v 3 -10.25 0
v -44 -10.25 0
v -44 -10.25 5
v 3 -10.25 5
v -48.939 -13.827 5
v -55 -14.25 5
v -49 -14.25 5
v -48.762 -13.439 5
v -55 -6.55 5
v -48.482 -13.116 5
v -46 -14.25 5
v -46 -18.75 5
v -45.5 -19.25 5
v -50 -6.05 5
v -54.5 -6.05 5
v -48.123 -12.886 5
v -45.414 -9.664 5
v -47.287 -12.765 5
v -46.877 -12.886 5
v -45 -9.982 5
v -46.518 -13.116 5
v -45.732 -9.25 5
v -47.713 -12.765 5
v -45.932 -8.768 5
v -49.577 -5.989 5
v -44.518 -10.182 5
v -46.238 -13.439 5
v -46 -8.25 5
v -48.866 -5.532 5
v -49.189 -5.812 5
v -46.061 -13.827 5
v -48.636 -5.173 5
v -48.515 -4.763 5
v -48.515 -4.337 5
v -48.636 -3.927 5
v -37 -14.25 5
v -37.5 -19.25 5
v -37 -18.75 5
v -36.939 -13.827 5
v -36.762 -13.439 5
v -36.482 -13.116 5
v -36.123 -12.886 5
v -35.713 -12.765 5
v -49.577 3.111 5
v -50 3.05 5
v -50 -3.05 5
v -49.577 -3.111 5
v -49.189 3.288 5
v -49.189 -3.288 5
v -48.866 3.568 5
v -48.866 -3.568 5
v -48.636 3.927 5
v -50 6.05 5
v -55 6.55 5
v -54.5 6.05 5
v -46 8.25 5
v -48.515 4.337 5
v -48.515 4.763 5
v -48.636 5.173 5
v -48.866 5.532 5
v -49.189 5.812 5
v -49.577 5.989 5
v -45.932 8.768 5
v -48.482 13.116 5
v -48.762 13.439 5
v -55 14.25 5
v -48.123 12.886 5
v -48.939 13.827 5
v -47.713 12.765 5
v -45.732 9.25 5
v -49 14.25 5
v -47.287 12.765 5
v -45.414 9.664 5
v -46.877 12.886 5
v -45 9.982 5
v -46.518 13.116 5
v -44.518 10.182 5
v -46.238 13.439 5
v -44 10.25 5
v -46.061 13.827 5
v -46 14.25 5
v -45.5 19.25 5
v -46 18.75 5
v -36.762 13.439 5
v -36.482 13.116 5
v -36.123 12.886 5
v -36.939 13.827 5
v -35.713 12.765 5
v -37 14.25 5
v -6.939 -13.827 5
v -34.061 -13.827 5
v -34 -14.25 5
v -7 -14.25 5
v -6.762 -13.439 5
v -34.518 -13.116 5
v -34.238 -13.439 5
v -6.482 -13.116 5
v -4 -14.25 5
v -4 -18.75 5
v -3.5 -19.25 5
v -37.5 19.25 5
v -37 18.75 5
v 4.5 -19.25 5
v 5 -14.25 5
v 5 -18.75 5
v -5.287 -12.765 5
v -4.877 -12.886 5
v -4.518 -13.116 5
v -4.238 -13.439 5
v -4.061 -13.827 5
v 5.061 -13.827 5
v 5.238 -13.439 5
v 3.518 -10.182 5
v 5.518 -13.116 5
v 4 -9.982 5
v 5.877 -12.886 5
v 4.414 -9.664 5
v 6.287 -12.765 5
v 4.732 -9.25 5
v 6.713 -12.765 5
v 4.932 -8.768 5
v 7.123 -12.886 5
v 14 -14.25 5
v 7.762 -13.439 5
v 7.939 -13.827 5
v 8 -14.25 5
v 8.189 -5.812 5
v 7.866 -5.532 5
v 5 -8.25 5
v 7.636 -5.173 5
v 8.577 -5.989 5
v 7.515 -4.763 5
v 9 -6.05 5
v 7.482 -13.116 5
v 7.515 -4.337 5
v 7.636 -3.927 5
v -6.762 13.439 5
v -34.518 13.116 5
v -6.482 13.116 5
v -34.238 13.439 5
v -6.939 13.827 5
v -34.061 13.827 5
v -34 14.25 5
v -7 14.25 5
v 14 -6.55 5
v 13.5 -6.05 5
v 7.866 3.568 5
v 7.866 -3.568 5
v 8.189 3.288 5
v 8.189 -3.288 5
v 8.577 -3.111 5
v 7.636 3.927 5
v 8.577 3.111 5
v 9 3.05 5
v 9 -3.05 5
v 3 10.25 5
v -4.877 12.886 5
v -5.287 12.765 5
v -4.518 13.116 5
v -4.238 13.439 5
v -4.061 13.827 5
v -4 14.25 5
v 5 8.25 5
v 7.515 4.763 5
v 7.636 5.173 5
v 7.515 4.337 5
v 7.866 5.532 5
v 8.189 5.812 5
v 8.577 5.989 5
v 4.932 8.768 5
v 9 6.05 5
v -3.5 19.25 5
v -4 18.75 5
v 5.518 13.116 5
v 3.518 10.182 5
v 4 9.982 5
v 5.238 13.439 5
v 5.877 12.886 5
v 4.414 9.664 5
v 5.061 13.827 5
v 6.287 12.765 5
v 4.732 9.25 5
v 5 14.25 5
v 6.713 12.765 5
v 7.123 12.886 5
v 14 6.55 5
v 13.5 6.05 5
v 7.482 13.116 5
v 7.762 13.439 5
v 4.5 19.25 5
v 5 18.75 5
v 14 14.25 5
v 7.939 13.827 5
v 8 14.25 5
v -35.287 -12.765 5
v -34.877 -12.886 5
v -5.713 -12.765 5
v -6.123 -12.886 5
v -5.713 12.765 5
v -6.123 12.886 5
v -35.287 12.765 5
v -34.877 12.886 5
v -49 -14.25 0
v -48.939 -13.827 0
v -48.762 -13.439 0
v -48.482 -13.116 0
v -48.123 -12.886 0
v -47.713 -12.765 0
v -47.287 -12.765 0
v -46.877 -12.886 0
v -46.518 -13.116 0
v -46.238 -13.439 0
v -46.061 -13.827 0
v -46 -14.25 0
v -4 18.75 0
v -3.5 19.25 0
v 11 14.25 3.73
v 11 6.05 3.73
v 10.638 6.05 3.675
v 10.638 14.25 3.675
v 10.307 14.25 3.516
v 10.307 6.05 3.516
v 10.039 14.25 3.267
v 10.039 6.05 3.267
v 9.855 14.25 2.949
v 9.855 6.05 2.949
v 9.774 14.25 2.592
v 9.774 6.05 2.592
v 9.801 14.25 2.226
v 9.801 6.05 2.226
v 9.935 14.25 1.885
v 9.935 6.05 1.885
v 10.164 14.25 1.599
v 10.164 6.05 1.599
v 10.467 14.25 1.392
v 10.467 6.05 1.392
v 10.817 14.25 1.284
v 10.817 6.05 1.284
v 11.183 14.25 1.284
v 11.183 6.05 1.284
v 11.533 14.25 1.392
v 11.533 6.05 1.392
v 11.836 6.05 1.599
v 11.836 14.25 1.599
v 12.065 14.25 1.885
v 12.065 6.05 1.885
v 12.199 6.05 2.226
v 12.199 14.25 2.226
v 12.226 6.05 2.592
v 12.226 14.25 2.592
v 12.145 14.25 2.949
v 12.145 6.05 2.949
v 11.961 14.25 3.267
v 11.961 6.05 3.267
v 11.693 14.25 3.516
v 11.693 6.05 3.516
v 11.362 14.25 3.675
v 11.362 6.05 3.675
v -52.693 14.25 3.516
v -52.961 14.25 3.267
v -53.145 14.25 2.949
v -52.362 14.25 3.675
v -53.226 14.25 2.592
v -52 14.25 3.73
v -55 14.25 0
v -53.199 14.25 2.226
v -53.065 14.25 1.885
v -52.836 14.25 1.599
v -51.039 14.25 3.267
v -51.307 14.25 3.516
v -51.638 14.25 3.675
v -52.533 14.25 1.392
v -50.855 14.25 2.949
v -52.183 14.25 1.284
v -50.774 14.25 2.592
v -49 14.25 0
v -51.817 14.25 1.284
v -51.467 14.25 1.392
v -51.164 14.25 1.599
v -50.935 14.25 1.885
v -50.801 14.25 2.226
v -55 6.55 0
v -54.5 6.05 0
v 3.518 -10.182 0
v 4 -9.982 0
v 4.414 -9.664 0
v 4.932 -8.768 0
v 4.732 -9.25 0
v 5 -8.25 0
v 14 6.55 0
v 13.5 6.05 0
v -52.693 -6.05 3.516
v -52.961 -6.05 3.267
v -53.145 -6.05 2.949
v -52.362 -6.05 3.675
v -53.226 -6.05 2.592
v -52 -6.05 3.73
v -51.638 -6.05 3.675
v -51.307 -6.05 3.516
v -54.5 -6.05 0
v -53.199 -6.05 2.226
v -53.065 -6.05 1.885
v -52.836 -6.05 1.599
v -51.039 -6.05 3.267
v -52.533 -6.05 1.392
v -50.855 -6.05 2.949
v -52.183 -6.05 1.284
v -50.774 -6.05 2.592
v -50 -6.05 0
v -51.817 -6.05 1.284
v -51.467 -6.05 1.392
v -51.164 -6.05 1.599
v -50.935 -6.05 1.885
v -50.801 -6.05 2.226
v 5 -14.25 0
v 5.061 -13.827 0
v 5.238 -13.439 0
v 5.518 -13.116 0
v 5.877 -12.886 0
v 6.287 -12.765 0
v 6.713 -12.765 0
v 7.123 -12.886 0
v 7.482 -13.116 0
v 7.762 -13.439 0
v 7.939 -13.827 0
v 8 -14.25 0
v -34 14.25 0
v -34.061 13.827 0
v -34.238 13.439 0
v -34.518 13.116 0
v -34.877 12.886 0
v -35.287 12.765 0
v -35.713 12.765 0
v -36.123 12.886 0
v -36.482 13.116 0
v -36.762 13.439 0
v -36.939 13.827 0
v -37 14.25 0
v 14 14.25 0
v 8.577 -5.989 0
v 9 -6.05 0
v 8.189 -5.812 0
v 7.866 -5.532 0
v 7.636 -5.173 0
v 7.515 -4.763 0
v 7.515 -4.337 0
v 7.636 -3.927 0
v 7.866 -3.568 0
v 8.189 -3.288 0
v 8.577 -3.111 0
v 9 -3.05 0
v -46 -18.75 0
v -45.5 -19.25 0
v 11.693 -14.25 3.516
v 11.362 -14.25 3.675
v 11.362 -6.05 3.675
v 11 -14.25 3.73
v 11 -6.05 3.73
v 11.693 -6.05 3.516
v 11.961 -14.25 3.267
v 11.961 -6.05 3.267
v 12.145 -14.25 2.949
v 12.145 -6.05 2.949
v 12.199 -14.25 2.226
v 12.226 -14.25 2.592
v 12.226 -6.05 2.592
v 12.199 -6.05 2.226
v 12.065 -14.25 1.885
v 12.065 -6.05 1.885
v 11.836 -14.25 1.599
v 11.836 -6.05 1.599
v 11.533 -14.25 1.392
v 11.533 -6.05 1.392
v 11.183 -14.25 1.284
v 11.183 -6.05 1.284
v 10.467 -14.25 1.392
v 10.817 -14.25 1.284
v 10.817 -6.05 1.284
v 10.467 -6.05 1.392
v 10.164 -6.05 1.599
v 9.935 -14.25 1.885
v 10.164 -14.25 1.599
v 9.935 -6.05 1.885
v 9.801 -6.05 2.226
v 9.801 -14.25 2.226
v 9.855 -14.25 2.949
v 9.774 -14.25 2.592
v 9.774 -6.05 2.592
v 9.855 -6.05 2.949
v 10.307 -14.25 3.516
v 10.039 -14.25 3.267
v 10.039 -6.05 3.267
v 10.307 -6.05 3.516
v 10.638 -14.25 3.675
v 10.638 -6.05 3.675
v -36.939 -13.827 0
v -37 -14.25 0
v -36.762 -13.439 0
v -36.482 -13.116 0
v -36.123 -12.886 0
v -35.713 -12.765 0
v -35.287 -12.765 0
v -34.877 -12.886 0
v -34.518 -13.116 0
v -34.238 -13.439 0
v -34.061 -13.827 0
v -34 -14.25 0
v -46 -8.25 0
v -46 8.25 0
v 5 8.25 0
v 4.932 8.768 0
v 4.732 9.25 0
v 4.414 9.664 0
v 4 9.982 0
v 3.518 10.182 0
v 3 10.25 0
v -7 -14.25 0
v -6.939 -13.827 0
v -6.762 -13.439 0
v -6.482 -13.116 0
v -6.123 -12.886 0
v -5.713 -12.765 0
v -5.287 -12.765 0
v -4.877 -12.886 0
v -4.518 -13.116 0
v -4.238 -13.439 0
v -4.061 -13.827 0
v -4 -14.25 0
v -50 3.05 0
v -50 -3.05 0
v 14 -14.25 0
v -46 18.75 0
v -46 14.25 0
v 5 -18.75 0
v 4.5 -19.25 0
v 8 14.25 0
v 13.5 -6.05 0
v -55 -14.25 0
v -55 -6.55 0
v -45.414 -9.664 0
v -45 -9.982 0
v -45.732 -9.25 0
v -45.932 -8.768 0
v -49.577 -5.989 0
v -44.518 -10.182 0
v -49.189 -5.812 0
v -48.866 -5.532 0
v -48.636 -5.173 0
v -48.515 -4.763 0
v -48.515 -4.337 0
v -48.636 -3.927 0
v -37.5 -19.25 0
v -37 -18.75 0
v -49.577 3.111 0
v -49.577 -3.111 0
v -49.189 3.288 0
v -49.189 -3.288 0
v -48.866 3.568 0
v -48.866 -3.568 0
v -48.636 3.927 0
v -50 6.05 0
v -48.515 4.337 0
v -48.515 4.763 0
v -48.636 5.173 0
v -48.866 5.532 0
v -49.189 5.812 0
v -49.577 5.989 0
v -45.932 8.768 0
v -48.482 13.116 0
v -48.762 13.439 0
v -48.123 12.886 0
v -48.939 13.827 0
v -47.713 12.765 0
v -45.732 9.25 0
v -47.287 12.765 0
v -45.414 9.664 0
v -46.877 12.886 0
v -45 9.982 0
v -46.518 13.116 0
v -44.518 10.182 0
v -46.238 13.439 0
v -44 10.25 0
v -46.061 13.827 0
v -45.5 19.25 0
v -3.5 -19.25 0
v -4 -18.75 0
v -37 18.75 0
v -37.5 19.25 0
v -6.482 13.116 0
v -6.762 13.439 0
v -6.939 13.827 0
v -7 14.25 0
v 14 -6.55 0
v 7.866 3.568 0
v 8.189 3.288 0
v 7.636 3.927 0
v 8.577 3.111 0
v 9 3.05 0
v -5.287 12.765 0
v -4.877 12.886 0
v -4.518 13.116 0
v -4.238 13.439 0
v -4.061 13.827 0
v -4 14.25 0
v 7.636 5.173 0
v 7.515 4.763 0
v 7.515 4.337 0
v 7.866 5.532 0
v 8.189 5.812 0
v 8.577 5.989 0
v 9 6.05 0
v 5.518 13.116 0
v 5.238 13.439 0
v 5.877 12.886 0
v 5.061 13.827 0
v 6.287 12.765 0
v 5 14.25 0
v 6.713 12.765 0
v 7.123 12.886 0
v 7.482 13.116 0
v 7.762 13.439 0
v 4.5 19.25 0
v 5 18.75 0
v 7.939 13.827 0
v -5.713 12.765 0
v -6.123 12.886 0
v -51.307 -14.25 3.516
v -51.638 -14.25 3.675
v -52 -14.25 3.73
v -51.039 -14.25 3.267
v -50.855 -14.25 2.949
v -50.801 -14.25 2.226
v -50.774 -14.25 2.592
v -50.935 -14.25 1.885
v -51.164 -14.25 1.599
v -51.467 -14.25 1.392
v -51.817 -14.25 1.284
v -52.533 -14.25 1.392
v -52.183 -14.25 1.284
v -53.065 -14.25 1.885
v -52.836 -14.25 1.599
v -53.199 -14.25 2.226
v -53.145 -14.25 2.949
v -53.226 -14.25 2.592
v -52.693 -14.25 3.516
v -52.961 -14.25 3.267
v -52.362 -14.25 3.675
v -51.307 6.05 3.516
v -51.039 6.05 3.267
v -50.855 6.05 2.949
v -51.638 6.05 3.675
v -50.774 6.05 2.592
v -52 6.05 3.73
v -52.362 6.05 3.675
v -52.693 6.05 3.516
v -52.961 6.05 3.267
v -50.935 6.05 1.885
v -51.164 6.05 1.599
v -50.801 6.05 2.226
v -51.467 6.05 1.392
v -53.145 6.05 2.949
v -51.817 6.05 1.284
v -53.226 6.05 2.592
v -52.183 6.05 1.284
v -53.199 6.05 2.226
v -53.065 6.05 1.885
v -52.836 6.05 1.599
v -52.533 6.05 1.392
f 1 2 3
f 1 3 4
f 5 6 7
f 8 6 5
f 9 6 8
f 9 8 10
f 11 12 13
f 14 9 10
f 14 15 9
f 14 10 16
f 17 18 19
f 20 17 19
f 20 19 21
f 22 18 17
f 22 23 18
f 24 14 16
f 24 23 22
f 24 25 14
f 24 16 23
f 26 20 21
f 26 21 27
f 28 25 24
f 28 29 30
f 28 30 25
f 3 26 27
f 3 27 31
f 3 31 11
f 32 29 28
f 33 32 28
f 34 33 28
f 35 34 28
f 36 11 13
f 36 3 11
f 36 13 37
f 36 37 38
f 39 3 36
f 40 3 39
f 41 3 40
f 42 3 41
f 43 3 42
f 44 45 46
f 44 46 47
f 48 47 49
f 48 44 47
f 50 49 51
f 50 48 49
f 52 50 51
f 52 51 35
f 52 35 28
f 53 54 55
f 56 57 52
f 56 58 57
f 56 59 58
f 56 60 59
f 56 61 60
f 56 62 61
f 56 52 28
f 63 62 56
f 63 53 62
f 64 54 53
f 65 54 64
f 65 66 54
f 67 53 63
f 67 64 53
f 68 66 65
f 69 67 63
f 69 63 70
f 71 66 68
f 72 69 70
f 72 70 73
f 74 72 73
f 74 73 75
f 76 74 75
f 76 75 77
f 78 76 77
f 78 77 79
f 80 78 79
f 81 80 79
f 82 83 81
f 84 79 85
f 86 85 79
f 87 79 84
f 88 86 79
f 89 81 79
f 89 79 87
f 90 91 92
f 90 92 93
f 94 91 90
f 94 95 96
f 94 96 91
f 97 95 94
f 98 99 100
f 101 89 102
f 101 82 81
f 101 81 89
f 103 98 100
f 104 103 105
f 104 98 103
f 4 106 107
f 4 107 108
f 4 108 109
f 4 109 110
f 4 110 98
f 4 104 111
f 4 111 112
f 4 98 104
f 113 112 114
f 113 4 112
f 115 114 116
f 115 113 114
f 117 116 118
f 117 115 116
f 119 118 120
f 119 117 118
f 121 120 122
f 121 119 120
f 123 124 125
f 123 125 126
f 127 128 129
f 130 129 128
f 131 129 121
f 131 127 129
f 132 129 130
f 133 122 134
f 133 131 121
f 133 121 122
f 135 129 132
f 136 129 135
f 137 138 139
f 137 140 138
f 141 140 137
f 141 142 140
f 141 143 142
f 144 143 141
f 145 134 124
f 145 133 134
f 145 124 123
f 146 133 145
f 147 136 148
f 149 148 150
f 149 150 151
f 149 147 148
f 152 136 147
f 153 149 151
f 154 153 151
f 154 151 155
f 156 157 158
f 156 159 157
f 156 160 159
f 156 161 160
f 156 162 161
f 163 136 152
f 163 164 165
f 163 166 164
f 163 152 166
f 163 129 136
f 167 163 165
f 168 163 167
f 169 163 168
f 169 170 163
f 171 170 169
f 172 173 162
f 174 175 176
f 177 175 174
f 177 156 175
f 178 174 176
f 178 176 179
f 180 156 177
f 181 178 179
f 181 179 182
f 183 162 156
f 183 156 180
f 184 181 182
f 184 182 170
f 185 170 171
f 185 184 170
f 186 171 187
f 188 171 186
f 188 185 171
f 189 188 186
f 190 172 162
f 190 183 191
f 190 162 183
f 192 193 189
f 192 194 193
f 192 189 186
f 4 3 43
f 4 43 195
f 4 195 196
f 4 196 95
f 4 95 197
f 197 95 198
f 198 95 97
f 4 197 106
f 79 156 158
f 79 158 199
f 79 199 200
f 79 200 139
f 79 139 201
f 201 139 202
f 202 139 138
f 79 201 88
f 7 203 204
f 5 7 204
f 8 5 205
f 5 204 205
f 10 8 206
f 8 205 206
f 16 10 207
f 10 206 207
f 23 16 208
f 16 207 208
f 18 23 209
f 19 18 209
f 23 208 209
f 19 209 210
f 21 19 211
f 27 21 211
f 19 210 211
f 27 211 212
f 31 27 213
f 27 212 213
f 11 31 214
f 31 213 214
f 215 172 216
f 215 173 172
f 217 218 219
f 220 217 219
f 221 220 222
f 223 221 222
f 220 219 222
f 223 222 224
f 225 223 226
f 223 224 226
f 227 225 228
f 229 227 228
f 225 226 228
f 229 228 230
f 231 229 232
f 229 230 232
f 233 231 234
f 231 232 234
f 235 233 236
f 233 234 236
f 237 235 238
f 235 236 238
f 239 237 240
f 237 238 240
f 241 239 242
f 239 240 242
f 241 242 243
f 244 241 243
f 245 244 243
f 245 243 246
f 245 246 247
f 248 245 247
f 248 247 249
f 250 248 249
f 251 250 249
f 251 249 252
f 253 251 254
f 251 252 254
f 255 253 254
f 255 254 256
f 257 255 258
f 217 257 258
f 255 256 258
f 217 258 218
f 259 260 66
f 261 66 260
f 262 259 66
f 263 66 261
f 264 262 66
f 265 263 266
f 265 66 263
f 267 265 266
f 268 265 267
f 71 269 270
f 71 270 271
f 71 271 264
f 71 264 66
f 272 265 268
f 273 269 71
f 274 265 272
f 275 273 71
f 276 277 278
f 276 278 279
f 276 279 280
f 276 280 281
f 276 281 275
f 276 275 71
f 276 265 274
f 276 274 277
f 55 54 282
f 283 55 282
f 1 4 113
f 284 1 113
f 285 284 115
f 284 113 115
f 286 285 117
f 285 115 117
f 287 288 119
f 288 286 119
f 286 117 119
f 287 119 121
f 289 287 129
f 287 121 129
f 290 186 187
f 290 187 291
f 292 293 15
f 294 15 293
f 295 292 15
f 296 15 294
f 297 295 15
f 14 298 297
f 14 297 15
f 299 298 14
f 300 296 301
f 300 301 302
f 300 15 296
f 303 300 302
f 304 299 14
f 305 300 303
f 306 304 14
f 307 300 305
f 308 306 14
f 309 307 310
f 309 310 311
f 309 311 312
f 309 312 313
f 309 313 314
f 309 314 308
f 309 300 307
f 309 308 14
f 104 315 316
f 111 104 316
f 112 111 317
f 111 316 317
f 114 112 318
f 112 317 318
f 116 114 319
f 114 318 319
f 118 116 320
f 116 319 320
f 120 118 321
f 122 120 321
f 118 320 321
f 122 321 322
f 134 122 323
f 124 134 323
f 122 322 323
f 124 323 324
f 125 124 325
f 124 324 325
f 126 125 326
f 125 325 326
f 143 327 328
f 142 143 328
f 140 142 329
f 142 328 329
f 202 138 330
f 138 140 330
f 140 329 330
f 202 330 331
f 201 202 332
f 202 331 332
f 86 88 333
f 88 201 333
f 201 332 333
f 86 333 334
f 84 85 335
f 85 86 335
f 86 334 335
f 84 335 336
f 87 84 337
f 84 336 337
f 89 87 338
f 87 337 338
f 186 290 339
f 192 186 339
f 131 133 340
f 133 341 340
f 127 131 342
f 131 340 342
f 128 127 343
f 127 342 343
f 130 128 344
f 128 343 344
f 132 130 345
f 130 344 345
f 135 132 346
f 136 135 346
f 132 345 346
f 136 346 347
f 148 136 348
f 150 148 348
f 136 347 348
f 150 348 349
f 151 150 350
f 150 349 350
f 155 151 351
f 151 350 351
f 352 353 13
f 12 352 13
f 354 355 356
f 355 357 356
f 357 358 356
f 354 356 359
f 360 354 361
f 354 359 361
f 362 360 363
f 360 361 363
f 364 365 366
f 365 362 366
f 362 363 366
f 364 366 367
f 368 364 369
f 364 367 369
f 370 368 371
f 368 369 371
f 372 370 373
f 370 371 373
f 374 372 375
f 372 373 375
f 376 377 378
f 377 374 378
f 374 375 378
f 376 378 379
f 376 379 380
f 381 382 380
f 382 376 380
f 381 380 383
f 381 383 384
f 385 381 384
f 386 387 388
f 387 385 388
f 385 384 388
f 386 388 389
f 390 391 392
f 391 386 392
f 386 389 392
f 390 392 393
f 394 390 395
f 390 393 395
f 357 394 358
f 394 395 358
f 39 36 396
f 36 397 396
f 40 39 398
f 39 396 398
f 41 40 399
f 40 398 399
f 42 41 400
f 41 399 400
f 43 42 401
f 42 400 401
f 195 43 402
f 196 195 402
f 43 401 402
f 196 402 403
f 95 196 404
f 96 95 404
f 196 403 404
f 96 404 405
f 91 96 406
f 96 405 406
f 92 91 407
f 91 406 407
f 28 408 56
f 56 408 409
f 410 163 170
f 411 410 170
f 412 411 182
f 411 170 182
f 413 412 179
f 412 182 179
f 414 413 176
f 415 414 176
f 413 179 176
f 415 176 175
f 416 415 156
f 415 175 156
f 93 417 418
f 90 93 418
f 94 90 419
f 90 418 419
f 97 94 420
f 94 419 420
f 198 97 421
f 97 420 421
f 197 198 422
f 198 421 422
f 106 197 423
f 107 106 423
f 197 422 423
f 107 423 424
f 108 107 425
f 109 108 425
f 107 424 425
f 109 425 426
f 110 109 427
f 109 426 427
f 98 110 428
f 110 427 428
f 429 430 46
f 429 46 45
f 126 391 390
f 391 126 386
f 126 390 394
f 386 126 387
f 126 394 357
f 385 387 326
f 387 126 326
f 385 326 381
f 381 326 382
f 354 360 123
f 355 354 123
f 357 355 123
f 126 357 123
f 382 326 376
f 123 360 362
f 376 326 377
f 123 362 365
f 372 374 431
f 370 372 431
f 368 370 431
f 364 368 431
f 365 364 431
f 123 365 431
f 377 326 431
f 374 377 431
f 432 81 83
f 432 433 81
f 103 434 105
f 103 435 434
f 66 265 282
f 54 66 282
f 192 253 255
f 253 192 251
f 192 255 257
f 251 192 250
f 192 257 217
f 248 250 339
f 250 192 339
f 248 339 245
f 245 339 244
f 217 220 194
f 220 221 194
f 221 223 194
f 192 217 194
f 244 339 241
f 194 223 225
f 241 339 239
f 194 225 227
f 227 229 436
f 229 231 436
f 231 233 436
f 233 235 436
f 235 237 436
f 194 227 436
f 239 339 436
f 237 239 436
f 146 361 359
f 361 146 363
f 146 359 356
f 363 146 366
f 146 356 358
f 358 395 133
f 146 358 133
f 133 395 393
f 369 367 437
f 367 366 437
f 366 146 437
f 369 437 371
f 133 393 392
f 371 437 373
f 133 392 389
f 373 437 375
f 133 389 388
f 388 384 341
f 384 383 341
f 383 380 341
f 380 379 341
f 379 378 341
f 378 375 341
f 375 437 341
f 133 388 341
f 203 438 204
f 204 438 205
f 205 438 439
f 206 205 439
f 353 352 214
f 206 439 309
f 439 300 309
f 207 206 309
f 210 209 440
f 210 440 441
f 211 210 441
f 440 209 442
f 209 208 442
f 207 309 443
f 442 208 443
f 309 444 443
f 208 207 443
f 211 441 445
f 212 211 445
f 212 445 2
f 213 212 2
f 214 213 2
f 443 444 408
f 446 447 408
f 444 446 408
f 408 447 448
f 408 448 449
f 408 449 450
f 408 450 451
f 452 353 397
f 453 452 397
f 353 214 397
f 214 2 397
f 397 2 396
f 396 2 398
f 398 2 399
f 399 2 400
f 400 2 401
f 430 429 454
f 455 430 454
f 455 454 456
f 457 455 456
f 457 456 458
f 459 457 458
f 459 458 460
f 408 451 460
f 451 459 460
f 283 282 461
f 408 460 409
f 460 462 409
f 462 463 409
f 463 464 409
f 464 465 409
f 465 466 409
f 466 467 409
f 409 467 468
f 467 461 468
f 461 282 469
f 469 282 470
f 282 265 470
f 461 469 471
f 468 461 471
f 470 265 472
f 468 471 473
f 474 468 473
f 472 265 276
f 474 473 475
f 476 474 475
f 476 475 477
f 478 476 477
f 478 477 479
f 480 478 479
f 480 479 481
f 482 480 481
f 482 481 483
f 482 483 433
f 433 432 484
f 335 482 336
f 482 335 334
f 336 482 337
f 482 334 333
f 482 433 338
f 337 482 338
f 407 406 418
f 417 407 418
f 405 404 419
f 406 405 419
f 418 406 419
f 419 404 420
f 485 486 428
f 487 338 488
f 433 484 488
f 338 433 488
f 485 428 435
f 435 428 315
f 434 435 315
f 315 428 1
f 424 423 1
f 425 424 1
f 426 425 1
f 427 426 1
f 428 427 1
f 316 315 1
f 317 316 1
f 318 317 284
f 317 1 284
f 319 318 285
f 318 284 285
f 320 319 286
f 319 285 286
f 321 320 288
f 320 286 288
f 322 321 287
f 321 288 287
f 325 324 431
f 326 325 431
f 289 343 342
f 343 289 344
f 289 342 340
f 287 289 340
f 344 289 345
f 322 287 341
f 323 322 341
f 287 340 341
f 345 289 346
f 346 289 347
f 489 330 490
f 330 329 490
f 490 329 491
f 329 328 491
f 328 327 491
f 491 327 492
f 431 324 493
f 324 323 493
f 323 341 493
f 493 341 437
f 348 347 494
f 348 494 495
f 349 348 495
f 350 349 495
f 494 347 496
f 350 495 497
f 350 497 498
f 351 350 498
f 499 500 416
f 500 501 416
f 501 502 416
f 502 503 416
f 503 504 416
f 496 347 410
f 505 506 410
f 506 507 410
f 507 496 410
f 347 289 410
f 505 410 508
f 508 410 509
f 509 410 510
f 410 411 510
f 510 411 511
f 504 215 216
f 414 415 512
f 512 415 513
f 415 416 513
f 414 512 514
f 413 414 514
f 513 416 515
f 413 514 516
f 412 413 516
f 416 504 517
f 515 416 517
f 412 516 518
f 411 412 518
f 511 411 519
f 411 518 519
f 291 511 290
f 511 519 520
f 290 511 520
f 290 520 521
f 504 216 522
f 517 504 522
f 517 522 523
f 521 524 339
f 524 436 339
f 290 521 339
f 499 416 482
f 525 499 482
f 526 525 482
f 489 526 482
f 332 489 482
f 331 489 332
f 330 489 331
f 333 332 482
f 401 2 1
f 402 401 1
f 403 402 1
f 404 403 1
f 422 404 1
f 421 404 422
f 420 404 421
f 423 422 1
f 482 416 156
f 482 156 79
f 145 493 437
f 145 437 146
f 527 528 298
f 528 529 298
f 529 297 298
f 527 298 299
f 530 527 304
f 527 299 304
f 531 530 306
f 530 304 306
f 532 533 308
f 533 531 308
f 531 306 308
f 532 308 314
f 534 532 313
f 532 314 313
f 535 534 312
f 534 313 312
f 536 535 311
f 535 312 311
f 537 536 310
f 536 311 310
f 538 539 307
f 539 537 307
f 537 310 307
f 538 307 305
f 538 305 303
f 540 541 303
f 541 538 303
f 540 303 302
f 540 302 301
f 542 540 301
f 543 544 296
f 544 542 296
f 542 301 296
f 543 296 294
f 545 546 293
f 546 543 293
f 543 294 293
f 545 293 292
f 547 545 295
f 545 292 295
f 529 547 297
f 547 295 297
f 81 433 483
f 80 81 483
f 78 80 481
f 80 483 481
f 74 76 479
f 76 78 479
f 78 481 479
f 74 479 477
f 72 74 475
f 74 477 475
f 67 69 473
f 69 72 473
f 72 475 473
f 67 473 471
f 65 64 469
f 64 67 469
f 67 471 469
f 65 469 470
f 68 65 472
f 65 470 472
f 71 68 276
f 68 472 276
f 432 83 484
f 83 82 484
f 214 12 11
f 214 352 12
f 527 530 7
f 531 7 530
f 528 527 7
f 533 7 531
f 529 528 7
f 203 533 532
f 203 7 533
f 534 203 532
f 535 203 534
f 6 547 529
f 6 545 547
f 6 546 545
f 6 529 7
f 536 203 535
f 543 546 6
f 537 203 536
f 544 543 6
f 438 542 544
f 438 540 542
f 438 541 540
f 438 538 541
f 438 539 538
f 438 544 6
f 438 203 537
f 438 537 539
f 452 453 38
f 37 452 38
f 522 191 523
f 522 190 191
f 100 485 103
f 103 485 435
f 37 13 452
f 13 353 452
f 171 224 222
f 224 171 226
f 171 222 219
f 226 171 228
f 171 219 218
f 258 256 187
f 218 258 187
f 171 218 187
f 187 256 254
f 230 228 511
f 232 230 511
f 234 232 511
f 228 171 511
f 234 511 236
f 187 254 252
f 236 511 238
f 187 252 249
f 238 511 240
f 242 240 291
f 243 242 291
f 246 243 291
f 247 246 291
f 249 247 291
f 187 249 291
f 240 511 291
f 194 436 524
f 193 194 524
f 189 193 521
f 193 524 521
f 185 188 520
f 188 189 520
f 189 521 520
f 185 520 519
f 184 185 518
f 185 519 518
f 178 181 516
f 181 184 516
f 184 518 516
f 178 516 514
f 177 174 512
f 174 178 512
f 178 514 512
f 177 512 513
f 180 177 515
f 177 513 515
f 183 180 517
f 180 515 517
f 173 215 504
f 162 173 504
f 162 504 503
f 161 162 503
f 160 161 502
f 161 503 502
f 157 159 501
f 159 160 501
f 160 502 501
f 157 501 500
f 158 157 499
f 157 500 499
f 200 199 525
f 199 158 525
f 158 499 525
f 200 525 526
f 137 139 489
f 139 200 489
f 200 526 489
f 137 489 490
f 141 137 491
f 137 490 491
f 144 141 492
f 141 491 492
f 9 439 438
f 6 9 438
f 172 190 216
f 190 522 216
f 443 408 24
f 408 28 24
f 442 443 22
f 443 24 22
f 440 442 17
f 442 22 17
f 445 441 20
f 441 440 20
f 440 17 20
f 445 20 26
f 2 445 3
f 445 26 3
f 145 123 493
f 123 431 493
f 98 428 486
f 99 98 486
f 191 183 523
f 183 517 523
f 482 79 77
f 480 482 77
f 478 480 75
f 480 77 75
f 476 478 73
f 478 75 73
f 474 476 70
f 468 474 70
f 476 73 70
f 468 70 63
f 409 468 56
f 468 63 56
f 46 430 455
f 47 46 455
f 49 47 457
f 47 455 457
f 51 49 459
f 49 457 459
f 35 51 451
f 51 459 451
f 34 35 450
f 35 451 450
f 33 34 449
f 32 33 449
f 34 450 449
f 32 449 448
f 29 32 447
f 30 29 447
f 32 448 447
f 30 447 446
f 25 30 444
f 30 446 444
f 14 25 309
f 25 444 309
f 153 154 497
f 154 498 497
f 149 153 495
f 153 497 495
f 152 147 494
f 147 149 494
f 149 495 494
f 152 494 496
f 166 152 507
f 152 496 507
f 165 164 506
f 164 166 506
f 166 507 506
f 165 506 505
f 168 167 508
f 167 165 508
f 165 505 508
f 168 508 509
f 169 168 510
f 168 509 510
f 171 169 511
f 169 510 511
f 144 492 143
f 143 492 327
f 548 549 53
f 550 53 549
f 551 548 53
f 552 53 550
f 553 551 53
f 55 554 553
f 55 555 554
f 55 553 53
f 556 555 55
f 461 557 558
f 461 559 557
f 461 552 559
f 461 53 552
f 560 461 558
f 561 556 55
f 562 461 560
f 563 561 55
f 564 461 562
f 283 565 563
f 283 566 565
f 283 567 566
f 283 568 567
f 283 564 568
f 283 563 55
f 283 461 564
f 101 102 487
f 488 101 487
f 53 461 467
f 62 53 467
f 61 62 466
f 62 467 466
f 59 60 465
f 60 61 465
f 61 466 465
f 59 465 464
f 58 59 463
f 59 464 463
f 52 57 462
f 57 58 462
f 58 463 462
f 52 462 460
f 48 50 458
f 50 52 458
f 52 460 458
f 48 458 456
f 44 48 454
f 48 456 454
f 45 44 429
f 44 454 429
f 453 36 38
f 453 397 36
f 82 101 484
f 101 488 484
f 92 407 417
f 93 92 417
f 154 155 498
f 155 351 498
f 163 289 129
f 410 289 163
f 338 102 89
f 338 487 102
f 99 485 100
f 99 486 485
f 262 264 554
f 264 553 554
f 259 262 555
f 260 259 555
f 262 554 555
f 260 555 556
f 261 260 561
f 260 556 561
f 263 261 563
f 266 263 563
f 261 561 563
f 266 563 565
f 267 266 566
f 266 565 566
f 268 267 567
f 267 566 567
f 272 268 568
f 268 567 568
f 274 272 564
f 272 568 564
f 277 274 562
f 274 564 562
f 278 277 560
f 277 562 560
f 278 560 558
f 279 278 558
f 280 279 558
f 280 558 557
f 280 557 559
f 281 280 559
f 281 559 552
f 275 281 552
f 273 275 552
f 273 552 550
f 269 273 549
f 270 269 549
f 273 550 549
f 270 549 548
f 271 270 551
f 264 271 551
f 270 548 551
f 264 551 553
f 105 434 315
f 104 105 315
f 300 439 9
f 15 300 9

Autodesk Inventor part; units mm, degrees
ref_plane "YZ Plane" through (0, 0, 0) normal (1, 0, 0) x (0, 1, 0)
ref_plane "XZ Plane" through (0, 0, 0) normal (0, 1, 0) x (-1, 0, 0)
ref_plane "XY Plane" through (0, 0, 0) normal (0, 0, 1) x (1, 0, 0)
sketch "Sketch1" plane through (0, 0, 0) normal (0, 0, 1) x (1, 0, 0)
  line L0 (-55, -19.25) -> (14, -19.25)
  line L1 (14, -19.25) -> (14, 19.25)
  line L2 (14, 19.25) -> (-55, 19.25)
  line L3 (-55, 19.25) -> (-55, -19.25)
  line L4 (-55, -19.25) -> (14, 19.25) construction
  line L5 (14, -19.25) -> (-55, 19.25) construction
  line L6 (14, -6.05) -> (9, -6.05)
  line L7 (9, -6.05) -> (9, 6.05)
  line L8 (9, 6.05) -> (14, 6.05)
  line L9 (14, 0) -> (-55, 0)
  line L10 (-4, 14.25) -> (-37, 14.25)
  arc A0 (9, 6.05) -> (9, 3.05) centre (9, 4.55) ccw
  arc A1 (9, -3.05) -> (9, -6.05) centre (9, -4.55) ccw
  line L11 (-4, -14.25) -> (-37, -14.25)
  line L12 (-20.5, -19.25) -> (-20.5, 19.25) construction
  line L13 (-55, -6.05) -> (-50, -6.05)
  line L14 (-50, -6.05) -> (-50, 6.05)
  line L15 (-50, 6.05) -> (-55, 6.05)
  arc A2 (-50, 3.05) -> (-50, 6.05) centre (-50, 4.55) ccw
  arc A3 (-50, -6.05) -> (-50, -3.05) centre (-50, -4.55) ccw
  line L16 (5, -10.25) -> (5, 10.25)
  line L17 (5, 10.25) -> (-46, 10.25)
  line L18 (5, -10.25) -> (-46, -10.25)
  line L19 (-46, -10.25) -> (-46, 10.25)
  line L20 (-55, -14.25) -> (-46, -14.25)
  line L21 (-46, -14.25) -> (-46, -19.25)
  line L22 (-37, -19.25) -> (-37, -14.25)
  arc A4 (-46, -14.25) -> (-49, -14.25) centre (-47.5, -14.25) ccw
  arc A5 (-34, -14.25) -> (-37, -14.25) centre (-35.5, -14.25) ccw
  line L23 (-55, 14.25) -> (-46, 14.25)
  line L24 (-46, 14.25) -> (-46, 19.25)
  line L25 (-37, 19.25) -> (-37, 14.25)
  arc A6 (-49, 14.25) -> (-46, 14.25) centre (-47.5, 14.25) ccw
  arc A7 (-37, 14.25) -> (-34, 14.25) centre (-35.5, 14.25) ccw
  line L26 (-52, 14.25) -> (-52, 8.25) construction
  line L27 (14, 6) -> (9, 6) construction
  line L28 (14, -6) -> (9, -6) construction
  line L29 (-4, 19.25) -> (-4, 14.25)
  line L30 (14, 14.25) -> (5, 14.25)
  line L31 (5, 14.25) -> (5, 19.25)
  line L32 (11, 14.25) -> (11, 8.25) construction
  arc A8 (5, 14.25) -> (8, 14.25) centre (6.5, 14.25) ccw
  arc A9 (-7, 14.25) -> (-4, 14.25) centre (-5.5, 14.25) ccw
  line L33 (-4, -19.25) -> (-4, -14.25)
  line L34 (14, -14.25) -> (5, -14.25)
  line L35 (5, -14.25) -> (5, -19.25)
  arc A10 (8, -14.25) -> (5, -14.25) centre (6.5, -14.25) ccw
  arc A11 (-4, -14.25) -> (-7, -14.25) centre (-5.5, -14.25) ccw
  point P0 (0, 0)
  point P1 (-20.5, 0)
  point P2 (-55, 6.05)
  point P3 (-55, -6.05)
  point P4 (-37, 19.25)
  point P5 (-55, 14.25)
  point P6 (-34, 14.25)
  point P7 (5, 0)
  point P8 (9, 0)
  point P9 (-50, 0)
  point P10 (-46, 0)
  dimension "d0" = 38.5
  dimension "d2" = 12.1
  dimension "d3" = 14
  dimension "d4" = 5
  dimension "d12" = 1.5
  dimension "d27" = 69
  dimension "d36" = 2.5
  dimension "d40" = 9
  dimension "d42" = 6
  dimension "d51" = 2.5
  dimension "d55" = 12
  dimension "d56" = 0.05
  dimension "d57" = 5
  dimension "d58" = 9
  dimension "d59" = 6
  dimension "d70" = 9
extrude "Extrusion1" add sketch "Sketch1" along normal blind 5 contours L3 L23 A6 L24 L2 L25 A7 L10 A9 L29 L31 A8 L30 L1 L8 A0 L7 L9 L16 L17 L19 L14 A2 L15
fillet "Fillet1" radius 2 2 edges at (5, 10.25, 2.5) (-46, 10.25, 2.5)
sketch "Sketch5" plane through (-34, 14.25, 0) normal (0, 1, 0) x (1, 0, 0)
  line L0 (45, 0) -> (45, -5)
  line L1 (43, -5) -> (48, -5) projected
  line L2 (-18, 0) -> (-18, -5)
  line L3 (-15, -5) -> (-21, -5) projected
  point P0 (34, 0)
  point P1 (45, -2.5)
  point P2 (-18, -2.5)
hole "Hole1" at (11, 14.25, 2.5) at (-52, 14.25, 2.5) direction (0, -1, 0) diameter 2.459 depth 8.8 thread size "M3x0.5" class "6H" standard "ANSI Metric M Profile"
chamfer "Chamfer1" distance 0.5 angle 45 6 edges at (14, 6.05, 2.5) (5, 19.25, 2.5) (-4, 19.25, 2.5) (-37, 19.25, 2.5) (-46, 19.25, 2.5) (-55, 6.05, 2.5)
mirror "Mirror1" about plane through (0, 0, 0) normal (0, 1, 0)
equation "\"d42\" = d6"
equation "\"d6\" = 6"
properties part number "LegBaseBraceFrame" material "Acetal Resin, Black"
